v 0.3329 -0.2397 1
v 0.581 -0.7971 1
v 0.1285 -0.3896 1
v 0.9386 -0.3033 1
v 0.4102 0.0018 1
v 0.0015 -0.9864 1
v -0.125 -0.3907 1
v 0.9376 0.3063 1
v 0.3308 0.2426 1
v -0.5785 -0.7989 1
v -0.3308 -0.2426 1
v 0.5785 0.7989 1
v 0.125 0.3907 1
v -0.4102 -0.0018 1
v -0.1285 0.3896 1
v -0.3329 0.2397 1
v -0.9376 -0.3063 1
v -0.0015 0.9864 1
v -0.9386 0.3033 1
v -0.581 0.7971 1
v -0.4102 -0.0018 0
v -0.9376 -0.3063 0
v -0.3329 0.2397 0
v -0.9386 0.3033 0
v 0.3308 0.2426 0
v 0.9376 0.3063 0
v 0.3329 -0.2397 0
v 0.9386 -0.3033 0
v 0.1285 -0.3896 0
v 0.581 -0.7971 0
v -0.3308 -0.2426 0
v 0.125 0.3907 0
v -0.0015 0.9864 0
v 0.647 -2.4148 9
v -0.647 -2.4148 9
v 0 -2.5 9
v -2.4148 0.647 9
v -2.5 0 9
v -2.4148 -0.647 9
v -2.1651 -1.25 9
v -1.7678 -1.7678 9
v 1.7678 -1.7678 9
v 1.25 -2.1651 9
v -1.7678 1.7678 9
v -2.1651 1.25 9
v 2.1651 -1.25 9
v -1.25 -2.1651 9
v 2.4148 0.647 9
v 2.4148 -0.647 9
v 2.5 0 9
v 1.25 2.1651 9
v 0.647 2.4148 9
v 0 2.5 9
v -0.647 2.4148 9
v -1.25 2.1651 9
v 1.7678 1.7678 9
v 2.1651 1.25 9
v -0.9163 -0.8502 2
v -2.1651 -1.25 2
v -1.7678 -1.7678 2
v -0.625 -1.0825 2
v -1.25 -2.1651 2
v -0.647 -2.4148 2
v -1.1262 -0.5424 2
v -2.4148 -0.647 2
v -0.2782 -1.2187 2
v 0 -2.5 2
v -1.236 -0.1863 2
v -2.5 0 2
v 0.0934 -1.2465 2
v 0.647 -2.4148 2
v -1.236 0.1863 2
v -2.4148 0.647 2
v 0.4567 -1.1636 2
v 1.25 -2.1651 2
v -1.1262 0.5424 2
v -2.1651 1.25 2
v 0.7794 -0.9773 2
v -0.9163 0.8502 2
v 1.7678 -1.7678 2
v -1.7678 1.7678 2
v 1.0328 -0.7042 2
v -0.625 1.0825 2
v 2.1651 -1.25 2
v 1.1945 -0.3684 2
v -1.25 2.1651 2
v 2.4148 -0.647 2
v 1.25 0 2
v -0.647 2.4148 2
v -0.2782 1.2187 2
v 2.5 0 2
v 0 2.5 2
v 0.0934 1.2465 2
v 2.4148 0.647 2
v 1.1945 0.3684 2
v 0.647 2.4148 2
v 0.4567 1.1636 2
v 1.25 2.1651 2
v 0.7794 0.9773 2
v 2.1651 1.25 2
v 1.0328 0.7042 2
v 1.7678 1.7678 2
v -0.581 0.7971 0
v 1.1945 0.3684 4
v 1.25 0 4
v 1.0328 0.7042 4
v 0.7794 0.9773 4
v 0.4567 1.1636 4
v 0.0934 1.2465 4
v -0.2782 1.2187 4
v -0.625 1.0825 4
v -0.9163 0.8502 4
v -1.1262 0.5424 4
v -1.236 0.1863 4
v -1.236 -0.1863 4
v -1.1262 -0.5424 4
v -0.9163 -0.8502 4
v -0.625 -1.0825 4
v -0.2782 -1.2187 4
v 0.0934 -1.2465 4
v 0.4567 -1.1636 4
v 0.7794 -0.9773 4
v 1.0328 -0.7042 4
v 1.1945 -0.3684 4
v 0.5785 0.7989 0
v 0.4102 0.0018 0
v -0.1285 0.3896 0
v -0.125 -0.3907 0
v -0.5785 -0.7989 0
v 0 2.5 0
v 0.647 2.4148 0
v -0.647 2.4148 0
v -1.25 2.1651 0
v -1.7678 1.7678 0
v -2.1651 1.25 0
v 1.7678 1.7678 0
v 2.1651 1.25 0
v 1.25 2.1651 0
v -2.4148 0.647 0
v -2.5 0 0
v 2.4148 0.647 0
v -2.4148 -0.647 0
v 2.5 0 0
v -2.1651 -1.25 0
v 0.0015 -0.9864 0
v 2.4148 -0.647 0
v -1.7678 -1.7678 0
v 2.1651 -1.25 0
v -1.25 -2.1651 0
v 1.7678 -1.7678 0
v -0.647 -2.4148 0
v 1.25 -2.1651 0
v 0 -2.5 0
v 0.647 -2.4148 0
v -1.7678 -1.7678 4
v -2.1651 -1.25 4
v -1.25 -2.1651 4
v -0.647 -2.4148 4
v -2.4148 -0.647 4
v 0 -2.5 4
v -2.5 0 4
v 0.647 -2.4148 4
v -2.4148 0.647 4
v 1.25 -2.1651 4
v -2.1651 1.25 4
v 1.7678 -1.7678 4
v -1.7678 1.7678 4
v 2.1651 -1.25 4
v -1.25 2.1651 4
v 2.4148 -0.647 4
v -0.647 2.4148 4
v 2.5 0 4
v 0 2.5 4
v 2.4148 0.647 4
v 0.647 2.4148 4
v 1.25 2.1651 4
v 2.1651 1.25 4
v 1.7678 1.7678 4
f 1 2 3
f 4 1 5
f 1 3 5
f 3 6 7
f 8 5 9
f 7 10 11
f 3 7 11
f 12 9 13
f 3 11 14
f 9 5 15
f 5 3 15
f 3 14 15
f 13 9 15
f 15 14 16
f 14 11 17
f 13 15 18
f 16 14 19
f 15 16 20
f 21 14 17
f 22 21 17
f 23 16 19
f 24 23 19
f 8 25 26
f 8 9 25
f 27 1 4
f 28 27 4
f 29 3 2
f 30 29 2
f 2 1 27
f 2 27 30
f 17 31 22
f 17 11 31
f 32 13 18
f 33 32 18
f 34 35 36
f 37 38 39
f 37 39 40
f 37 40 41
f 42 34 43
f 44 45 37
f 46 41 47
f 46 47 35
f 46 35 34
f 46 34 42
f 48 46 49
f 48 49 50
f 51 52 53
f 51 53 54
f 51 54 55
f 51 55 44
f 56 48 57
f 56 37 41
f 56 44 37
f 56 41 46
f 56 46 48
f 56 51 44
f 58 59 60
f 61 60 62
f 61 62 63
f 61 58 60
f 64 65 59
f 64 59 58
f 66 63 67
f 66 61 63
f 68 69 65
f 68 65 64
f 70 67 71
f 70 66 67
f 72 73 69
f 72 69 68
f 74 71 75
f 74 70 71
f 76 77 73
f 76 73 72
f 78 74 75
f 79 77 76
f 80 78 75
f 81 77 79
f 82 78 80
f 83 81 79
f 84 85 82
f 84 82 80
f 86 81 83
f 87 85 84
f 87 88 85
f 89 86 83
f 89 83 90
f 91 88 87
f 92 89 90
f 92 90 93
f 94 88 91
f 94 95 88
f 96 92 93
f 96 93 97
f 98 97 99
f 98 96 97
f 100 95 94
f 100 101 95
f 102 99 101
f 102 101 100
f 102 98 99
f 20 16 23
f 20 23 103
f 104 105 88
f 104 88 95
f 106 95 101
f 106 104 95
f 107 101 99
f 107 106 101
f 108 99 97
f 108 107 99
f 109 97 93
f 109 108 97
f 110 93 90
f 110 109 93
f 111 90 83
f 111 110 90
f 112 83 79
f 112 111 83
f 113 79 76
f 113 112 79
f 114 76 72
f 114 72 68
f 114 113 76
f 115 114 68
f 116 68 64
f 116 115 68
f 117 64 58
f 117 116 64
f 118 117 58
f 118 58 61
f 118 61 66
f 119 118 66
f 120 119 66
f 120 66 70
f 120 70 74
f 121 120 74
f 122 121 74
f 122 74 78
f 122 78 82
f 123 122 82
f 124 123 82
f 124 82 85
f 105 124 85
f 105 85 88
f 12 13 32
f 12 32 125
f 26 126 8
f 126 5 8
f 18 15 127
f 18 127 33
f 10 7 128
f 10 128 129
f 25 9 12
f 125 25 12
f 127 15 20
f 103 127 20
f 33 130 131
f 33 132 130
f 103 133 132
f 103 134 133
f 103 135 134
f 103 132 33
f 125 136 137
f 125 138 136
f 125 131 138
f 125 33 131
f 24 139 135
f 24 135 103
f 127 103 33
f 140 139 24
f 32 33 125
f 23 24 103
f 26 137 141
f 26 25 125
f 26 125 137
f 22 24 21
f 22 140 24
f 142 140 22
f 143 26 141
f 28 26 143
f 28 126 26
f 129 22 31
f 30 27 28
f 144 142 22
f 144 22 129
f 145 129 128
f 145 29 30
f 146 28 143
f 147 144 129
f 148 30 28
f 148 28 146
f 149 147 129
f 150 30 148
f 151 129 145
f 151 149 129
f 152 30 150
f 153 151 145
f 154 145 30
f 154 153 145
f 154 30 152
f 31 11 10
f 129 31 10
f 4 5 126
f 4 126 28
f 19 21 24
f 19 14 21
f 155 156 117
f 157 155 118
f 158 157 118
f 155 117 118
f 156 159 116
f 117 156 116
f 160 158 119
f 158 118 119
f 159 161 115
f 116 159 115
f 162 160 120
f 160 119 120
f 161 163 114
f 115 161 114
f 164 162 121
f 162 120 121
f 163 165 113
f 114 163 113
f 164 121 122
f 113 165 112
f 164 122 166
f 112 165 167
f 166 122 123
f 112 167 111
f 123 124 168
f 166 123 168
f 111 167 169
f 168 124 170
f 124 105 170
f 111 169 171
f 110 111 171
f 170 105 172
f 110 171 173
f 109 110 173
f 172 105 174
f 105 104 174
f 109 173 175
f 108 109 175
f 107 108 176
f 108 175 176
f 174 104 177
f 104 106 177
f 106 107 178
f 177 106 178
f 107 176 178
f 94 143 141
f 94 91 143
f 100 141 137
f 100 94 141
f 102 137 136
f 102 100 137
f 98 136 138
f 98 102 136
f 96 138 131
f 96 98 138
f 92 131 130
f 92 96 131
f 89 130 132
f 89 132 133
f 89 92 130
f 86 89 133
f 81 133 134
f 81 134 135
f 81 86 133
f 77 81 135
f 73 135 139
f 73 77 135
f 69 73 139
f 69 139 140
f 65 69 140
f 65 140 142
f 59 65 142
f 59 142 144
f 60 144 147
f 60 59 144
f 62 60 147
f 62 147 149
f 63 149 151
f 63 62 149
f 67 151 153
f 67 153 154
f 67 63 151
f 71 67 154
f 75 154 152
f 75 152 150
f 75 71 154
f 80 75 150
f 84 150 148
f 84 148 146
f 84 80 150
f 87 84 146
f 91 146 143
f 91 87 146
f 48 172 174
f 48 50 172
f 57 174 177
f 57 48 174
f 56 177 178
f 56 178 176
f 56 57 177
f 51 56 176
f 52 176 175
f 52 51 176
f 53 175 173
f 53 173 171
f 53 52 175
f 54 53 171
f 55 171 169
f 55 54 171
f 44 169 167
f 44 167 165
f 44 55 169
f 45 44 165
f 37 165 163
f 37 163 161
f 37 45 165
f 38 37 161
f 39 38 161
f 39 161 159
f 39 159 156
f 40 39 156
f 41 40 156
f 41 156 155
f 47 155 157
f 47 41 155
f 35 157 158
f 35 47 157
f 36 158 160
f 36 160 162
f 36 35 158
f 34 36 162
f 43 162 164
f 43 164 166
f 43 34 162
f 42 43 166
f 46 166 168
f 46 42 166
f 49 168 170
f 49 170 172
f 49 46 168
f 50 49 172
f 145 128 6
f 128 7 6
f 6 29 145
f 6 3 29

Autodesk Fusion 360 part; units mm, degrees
cylinder "CylinderPrimitive1" add diameter 5 height 2 placed x (1, 0, 0) y (0, 1, 0) z (0, 0, 1) at (0, 0, 0)
cylinder "CylinderPrimitive2" add diameter 2.5 height 2 placed x (1, 0, 0) y (0, 1, 0) z (0, 0, 1) at (0, 0, 2)
cylinder "CylinderPrimitive3" add diameter 5 height 5 placed x (1, 0, 0) y (0, 1, 0) z (0, 0, 1) at (0, 0, 4)
hole "Hole1" at (0, 0, 0) direction (0, 0, 1) diameter 2 depth 1 tip angle 180
sketch "Sketch5" plane through (0, 0, 1) normal (0, 0, -1) x (1, 0, 0)
  circle A0 centre (0, 0) radius 1
  line L0 (-1, 0.0018) -> (-0.4102, 0.0018)
  line L1 (-0.4102, 0.0018) -> (-1.1, 0.4)
  line L2 (-0.4102, 0.0018) -> (-0.9506, -0.3103)
  line L3 (-0.4102, 0.0018) -> (-1.1146, 0.0018) construction
  dimension "d10" = 30
  dimension "d11" = 30
extrude "Extrude1" add sketch "Sketch5" along normal blind 1 contours A0 L0 L1
extrude "Extrude2" add sketch "Sketch5" along normal blind 1 contours A0 L0 L2
pattern_circular "C-Pattern1" count 10 over 360 about axis through (0, 0, 2) along (0, 0, 1) of 2 faces at (-0.59, -0.1056, 0.6667) (-0.5904, 0.1023, 0.6667)
